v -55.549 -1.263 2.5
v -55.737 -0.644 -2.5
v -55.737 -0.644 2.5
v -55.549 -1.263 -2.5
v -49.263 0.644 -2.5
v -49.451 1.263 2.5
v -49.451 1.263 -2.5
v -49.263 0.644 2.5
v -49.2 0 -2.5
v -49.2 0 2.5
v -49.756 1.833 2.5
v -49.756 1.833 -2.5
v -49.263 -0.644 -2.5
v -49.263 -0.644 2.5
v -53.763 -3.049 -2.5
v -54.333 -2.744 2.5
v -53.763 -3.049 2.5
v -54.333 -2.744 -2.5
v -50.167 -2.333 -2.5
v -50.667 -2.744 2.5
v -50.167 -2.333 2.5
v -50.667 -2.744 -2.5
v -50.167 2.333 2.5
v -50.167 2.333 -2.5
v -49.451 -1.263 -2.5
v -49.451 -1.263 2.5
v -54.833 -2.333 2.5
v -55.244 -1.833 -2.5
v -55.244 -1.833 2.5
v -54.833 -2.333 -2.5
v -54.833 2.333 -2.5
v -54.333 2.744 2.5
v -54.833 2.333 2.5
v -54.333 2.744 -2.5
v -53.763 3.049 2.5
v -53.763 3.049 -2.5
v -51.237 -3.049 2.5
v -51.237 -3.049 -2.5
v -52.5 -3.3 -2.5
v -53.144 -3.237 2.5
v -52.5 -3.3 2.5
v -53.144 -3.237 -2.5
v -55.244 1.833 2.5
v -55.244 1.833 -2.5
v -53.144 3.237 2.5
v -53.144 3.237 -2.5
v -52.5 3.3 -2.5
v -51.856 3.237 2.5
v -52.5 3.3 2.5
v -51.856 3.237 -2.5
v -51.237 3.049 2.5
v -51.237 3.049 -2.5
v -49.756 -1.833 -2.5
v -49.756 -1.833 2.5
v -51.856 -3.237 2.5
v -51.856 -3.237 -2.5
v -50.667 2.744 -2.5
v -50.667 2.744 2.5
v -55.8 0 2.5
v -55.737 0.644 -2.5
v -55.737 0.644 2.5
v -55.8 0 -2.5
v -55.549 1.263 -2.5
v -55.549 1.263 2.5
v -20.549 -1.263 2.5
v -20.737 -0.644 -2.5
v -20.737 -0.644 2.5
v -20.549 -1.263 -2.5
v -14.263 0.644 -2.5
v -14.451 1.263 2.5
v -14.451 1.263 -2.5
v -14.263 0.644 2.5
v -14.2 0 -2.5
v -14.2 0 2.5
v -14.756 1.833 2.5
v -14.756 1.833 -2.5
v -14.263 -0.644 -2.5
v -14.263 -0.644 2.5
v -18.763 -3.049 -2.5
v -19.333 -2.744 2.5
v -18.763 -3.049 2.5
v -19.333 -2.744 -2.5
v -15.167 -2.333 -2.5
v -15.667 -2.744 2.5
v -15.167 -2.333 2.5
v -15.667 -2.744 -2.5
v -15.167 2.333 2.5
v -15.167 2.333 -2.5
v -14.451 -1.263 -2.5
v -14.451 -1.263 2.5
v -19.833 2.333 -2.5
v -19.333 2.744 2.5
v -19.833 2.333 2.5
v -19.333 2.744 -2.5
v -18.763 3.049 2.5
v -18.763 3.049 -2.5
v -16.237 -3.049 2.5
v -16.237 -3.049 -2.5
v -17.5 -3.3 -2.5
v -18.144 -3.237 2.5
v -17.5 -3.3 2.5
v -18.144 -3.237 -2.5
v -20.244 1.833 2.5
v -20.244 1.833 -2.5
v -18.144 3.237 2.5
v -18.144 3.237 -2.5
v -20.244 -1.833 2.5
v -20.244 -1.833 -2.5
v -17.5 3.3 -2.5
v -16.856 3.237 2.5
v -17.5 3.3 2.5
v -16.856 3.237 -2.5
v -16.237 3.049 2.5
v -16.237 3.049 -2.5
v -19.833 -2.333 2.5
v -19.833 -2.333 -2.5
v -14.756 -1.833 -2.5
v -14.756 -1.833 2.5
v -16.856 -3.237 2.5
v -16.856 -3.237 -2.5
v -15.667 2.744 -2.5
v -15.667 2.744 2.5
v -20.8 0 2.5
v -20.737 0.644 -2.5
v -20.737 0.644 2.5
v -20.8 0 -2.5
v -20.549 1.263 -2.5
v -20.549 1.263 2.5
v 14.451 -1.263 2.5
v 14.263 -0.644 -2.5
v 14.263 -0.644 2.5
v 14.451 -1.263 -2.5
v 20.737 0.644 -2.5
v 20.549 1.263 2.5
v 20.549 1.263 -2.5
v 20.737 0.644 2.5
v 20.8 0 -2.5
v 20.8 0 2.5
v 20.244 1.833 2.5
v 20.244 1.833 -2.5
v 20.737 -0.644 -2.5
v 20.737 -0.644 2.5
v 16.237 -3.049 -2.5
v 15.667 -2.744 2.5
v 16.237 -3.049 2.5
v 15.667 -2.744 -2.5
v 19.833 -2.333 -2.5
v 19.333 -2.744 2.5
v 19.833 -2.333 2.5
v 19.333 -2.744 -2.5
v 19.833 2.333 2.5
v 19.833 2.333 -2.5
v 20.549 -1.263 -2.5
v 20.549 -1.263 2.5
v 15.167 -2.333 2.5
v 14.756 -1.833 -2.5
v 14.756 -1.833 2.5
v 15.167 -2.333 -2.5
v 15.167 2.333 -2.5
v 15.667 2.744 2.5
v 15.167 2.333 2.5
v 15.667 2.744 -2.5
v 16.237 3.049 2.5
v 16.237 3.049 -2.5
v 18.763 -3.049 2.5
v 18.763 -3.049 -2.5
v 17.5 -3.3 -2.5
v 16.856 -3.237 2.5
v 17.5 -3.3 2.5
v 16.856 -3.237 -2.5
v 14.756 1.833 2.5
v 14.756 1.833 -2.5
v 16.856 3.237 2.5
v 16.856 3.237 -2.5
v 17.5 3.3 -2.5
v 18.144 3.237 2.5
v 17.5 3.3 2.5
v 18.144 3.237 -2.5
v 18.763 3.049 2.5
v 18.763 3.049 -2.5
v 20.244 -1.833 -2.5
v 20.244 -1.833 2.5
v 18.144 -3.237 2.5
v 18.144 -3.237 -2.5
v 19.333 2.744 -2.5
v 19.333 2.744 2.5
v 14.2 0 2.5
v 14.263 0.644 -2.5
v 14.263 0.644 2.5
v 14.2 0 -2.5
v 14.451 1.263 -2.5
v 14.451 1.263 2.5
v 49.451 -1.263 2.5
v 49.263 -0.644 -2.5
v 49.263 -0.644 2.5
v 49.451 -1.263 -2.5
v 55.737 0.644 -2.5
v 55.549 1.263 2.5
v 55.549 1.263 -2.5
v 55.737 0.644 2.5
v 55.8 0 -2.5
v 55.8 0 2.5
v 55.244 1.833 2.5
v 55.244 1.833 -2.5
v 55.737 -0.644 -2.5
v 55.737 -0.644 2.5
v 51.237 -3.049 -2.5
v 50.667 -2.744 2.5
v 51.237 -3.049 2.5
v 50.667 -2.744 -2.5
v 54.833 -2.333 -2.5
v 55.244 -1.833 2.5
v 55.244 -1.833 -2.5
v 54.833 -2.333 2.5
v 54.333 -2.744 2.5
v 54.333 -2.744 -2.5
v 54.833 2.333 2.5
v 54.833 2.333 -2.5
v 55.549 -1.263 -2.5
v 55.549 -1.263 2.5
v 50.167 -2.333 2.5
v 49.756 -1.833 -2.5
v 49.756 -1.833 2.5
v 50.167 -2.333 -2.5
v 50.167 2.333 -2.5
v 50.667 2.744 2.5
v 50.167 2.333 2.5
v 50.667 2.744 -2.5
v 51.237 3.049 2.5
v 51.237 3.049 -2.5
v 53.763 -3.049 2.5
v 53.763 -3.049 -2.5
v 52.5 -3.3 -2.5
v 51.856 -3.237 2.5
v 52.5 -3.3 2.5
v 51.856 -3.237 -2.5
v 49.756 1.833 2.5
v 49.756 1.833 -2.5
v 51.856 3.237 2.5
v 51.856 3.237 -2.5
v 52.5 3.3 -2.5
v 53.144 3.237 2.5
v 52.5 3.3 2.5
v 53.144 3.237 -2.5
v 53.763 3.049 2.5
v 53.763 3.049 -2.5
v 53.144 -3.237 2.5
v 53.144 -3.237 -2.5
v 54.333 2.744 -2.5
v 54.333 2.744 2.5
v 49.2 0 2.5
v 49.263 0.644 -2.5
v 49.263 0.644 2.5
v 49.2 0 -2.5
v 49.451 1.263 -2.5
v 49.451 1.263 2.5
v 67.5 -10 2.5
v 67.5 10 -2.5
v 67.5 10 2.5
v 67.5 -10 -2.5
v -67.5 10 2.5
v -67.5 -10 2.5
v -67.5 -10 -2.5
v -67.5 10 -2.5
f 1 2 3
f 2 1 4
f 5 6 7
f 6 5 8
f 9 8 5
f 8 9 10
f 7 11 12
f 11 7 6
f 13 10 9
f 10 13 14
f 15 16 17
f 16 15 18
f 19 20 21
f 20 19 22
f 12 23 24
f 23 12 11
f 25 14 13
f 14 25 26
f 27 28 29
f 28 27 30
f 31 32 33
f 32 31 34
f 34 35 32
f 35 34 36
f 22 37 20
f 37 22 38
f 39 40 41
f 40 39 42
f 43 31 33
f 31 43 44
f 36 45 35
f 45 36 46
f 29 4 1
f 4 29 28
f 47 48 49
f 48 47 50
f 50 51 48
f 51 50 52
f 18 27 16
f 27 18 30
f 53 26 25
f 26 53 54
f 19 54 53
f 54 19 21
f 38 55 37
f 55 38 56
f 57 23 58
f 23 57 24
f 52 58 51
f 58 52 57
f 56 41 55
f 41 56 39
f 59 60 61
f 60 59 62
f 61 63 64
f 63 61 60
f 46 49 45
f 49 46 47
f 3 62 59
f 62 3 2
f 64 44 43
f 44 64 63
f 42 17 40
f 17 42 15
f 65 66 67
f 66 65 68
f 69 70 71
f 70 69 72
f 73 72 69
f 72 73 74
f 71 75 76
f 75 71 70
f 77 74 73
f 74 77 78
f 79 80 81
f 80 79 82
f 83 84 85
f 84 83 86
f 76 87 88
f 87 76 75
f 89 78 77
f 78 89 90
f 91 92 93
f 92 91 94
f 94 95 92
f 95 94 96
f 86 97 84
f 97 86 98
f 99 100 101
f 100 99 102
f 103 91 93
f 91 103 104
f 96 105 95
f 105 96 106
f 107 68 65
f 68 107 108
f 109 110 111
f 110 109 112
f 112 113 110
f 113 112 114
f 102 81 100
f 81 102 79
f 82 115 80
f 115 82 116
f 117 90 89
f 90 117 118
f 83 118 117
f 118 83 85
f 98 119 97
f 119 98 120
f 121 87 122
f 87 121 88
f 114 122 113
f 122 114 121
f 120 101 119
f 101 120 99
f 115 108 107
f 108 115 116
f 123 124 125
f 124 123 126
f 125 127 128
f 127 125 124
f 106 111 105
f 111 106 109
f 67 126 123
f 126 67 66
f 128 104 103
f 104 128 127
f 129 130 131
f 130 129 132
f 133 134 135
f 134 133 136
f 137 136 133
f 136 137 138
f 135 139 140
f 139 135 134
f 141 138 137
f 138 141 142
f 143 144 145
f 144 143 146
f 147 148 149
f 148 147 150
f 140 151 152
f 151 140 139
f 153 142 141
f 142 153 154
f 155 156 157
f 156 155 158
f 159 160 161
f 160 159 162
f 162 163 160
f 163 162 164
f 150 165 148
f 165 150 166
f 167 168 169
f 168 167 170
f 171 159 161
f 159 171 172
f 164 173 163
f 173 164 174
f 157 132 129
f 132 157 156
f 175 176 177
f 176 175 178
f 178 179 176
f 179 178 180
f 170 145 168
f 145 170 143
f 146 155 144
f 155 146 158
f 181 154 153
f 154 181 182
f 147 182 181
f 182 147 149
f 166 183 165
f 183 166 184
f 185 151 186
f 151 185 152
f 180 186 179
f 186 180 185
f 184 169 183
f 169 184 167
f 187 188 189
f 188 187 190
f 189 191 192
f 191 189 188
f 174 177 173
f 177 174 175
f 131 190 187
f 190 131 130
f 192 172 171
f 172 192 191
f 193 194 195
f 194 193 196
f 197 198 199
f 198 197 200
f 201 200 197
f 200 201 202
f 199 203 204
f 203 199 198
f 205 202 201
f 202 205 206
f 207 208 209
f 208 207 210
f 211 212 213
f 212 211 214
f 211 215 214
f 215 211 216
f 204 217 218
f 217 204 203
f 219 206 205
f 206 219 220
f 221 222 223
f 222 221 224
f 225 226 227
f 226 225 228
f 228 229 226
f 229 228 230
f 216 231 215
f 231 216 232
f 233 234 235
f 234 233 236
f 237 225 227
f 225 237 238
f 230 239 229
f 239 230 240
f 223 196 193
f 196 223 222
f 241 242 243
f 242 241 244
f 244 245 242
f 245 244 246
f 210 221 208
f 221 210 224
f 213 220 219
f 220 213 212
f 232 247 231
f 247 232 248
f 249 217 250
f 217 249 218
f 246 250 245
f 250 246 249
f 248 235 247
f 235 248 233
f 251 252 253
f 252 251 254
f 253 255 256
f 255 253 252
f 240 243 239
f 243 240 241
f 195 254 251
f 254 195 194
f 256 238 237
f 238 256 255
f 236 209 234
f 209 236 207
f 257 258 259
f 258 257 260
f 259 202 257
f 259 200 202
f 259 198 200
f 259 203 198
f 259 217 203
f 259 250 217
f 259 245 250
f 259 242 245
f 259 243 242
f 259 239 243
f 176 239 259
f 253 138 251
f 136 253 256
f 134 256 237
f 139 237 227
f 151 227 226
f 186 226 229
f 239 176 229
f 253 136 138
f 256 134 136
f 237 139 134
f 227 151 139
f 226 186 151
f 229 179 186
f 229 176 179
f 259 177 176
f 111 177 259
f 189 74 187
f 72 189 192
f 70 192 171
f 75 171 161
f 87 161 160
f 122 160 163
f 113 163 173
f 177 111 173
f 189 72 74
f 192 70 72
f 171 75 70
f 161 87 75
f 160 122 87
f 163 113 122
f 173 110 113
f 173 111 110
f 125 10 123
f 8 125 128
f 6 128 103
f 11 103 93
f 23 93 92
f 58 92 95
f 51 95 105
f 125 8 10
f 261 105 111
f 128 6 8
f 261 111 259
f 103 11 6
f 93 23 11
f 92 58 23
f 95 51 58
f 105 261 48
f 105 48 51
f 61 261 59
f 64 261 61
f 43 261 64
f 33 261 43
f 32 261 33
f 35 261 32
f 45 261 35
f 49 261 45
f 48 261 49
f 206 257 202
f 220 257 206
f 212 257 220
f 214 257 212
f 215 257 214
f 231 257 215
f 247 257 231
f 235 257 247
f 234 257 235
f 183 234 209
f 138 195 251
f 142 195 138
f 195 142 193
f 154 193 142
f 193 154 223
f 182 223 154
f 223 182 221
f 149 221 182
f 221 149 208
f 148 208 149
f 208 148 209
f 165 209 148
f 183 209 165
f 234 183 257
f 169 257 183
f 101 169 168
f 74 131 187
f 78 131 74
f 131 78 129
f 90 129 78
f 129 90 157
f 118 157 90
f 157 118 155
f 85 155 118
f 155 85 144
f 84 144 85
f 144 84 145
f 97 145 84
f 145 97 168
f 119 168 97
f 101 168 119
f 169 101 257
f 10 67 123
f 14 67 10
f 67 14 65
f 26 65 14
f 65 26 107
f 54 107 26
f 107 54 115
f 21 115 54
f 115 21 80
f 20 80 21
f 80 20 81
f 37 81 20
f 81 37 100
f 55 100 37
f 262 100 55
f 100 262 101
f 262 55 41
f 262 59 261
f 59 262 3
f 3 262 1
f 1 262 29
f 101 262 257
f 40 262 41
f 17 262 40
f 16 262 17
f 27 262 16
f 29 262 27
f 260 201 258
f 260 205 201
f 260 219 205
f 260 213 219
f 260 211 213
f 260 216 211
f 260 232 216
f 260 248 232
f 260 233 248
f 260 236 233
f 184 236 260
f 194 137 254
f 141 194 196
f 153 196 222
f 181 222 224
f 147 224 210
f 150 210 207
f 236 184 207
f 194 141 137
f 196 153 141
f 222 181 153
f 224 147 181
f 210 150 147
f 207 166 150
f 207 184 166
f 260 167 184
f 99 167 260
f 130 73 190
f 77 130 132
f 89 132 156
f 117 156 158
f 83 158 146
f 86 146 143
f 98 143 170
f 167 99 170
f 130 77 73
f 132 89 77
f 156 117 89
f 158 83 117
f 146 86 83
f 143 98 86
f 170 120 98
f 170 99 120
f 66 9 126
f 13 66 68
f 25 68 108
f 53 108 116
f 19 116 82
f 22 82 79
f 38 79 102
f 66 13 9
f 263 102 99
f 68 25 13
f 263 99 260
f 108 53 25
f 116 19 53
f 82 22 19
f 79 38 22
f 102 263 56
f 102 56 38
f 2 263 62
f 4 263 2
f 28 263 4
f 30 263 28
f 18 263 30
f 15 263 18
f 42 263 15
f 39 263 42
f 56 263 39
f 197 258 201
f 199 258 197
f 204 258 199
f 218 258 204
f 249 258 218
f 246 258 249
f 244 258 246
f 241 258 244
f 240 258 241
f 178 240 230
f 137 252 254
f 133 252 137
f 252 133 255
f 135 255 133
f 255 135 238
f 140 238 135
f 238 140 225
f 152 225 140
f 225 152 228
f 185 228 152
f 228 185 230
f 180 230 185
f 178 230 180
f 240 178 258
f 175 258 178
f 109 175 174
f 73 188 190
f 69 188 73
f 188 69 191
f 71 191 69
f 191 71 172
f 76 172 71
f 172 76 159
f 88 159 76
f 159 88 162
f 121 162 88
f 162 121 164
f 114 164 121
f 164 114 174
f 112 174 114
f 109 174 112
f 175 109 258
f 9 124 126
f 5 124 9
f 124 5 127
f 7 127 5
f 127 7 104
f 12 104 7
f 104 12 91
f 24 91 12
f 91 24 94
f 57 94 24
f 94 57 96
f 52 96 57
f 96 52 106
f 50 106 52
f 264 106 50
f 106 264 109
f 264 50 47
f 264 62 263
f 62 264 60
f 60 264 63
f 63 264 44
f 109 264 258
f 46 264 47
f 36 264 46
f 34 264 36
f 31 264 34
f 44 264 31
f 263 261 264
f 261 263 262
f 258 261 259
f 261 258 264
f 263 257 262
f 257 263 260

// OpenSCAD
$fn = 32;

// ----------------------------------------------------------------------
// Hole bar, 4 x Ø6.6
// skip layout, 15 mm edge offset
// ----------------------------------------------------------------------

// --- parameters (mm) ---
bar_w = 20;         // bar width (Y)
bar_t = 5;          // bar thickness (Z)
holes = 4;          // holes per row
hole_d = 6.6;       // hole diameter
edge = 15;          // offset from the bar end to the first hole
grid_pitch = 17.5;  // grid the bar was laid out on

// --- derived feature positions (mm) ---
pitch = grid_pitch * 2;       // = 35   holes sit every other grid slot
span = (holes - 1) * pitch;   // = 105   distance between the end holes
bar_l = span + 2 * edge;      // = 135   overall bar length
start_x = -bar_l / 2 + edge;  // = -52.5   X of the first hole
feature_centers = [
  [start_x + 0 * pitch, 0],
  [start_x + 1 * pitch, 0],
  [start_x + 2 * pitch, 0],
  [start_x + 3 * pitch, 0]
];   // hole centres of the first row

// bar with one row of holes, drilled from feature_centers
difference() {
  translate([-bar_l / 2, -bar_w / 2, -bar_t / 2]) cube([bar_l, bar_w, bar_t]);
  for (centre = feature_centers)
    translate([centre[0], centre[1], 0])
      cylinder(d = hole_d, h = bar_t + 2, center = true);
}
